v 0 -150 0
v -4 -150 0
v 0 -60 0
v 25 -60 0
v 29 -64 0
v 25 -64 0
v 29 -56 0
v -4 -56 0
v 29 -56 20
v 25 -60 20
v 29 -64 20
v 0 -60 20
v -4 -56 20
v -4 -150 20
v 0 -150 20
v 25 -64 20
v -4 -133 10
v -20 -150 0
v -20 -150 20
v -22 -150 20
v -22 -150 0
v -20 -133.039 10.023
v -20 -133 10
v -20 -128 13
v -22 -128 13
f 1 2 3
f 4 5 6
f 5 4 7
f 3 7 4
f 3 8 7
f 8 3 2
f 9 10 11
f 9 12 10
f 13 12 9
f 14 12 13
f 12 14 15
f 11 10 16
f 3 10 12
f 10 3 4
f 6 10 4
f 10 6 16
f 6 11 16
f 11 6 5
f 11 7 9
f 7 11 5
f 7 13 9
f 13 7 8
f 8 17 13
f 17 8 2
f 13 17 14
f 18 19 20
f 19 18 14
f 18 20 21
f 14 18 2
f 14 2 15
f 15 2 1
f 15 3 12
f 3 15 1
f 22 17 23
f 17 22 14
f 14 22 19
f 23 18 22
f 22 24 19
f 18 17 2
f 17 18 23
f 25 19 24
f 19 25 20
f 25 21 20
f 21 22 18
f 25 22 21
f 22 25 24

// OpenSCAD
    
linear_extrude (height=20, $fn = 200)
import (file="profil.dxf", layer="4", $fn=500);

translate ([0,-150,0])
rotate([0,270,0])
linear_extrude (height=20, $fn = 200) polygon(points=[[0,0],[20,0],[10,17]]);

translate ([-20,-150,0])
rotate([0,270,0])
linear_extrude (height=2, $fn = 200) polygon(points=[[0,0],[20,0],[13,22]]);
